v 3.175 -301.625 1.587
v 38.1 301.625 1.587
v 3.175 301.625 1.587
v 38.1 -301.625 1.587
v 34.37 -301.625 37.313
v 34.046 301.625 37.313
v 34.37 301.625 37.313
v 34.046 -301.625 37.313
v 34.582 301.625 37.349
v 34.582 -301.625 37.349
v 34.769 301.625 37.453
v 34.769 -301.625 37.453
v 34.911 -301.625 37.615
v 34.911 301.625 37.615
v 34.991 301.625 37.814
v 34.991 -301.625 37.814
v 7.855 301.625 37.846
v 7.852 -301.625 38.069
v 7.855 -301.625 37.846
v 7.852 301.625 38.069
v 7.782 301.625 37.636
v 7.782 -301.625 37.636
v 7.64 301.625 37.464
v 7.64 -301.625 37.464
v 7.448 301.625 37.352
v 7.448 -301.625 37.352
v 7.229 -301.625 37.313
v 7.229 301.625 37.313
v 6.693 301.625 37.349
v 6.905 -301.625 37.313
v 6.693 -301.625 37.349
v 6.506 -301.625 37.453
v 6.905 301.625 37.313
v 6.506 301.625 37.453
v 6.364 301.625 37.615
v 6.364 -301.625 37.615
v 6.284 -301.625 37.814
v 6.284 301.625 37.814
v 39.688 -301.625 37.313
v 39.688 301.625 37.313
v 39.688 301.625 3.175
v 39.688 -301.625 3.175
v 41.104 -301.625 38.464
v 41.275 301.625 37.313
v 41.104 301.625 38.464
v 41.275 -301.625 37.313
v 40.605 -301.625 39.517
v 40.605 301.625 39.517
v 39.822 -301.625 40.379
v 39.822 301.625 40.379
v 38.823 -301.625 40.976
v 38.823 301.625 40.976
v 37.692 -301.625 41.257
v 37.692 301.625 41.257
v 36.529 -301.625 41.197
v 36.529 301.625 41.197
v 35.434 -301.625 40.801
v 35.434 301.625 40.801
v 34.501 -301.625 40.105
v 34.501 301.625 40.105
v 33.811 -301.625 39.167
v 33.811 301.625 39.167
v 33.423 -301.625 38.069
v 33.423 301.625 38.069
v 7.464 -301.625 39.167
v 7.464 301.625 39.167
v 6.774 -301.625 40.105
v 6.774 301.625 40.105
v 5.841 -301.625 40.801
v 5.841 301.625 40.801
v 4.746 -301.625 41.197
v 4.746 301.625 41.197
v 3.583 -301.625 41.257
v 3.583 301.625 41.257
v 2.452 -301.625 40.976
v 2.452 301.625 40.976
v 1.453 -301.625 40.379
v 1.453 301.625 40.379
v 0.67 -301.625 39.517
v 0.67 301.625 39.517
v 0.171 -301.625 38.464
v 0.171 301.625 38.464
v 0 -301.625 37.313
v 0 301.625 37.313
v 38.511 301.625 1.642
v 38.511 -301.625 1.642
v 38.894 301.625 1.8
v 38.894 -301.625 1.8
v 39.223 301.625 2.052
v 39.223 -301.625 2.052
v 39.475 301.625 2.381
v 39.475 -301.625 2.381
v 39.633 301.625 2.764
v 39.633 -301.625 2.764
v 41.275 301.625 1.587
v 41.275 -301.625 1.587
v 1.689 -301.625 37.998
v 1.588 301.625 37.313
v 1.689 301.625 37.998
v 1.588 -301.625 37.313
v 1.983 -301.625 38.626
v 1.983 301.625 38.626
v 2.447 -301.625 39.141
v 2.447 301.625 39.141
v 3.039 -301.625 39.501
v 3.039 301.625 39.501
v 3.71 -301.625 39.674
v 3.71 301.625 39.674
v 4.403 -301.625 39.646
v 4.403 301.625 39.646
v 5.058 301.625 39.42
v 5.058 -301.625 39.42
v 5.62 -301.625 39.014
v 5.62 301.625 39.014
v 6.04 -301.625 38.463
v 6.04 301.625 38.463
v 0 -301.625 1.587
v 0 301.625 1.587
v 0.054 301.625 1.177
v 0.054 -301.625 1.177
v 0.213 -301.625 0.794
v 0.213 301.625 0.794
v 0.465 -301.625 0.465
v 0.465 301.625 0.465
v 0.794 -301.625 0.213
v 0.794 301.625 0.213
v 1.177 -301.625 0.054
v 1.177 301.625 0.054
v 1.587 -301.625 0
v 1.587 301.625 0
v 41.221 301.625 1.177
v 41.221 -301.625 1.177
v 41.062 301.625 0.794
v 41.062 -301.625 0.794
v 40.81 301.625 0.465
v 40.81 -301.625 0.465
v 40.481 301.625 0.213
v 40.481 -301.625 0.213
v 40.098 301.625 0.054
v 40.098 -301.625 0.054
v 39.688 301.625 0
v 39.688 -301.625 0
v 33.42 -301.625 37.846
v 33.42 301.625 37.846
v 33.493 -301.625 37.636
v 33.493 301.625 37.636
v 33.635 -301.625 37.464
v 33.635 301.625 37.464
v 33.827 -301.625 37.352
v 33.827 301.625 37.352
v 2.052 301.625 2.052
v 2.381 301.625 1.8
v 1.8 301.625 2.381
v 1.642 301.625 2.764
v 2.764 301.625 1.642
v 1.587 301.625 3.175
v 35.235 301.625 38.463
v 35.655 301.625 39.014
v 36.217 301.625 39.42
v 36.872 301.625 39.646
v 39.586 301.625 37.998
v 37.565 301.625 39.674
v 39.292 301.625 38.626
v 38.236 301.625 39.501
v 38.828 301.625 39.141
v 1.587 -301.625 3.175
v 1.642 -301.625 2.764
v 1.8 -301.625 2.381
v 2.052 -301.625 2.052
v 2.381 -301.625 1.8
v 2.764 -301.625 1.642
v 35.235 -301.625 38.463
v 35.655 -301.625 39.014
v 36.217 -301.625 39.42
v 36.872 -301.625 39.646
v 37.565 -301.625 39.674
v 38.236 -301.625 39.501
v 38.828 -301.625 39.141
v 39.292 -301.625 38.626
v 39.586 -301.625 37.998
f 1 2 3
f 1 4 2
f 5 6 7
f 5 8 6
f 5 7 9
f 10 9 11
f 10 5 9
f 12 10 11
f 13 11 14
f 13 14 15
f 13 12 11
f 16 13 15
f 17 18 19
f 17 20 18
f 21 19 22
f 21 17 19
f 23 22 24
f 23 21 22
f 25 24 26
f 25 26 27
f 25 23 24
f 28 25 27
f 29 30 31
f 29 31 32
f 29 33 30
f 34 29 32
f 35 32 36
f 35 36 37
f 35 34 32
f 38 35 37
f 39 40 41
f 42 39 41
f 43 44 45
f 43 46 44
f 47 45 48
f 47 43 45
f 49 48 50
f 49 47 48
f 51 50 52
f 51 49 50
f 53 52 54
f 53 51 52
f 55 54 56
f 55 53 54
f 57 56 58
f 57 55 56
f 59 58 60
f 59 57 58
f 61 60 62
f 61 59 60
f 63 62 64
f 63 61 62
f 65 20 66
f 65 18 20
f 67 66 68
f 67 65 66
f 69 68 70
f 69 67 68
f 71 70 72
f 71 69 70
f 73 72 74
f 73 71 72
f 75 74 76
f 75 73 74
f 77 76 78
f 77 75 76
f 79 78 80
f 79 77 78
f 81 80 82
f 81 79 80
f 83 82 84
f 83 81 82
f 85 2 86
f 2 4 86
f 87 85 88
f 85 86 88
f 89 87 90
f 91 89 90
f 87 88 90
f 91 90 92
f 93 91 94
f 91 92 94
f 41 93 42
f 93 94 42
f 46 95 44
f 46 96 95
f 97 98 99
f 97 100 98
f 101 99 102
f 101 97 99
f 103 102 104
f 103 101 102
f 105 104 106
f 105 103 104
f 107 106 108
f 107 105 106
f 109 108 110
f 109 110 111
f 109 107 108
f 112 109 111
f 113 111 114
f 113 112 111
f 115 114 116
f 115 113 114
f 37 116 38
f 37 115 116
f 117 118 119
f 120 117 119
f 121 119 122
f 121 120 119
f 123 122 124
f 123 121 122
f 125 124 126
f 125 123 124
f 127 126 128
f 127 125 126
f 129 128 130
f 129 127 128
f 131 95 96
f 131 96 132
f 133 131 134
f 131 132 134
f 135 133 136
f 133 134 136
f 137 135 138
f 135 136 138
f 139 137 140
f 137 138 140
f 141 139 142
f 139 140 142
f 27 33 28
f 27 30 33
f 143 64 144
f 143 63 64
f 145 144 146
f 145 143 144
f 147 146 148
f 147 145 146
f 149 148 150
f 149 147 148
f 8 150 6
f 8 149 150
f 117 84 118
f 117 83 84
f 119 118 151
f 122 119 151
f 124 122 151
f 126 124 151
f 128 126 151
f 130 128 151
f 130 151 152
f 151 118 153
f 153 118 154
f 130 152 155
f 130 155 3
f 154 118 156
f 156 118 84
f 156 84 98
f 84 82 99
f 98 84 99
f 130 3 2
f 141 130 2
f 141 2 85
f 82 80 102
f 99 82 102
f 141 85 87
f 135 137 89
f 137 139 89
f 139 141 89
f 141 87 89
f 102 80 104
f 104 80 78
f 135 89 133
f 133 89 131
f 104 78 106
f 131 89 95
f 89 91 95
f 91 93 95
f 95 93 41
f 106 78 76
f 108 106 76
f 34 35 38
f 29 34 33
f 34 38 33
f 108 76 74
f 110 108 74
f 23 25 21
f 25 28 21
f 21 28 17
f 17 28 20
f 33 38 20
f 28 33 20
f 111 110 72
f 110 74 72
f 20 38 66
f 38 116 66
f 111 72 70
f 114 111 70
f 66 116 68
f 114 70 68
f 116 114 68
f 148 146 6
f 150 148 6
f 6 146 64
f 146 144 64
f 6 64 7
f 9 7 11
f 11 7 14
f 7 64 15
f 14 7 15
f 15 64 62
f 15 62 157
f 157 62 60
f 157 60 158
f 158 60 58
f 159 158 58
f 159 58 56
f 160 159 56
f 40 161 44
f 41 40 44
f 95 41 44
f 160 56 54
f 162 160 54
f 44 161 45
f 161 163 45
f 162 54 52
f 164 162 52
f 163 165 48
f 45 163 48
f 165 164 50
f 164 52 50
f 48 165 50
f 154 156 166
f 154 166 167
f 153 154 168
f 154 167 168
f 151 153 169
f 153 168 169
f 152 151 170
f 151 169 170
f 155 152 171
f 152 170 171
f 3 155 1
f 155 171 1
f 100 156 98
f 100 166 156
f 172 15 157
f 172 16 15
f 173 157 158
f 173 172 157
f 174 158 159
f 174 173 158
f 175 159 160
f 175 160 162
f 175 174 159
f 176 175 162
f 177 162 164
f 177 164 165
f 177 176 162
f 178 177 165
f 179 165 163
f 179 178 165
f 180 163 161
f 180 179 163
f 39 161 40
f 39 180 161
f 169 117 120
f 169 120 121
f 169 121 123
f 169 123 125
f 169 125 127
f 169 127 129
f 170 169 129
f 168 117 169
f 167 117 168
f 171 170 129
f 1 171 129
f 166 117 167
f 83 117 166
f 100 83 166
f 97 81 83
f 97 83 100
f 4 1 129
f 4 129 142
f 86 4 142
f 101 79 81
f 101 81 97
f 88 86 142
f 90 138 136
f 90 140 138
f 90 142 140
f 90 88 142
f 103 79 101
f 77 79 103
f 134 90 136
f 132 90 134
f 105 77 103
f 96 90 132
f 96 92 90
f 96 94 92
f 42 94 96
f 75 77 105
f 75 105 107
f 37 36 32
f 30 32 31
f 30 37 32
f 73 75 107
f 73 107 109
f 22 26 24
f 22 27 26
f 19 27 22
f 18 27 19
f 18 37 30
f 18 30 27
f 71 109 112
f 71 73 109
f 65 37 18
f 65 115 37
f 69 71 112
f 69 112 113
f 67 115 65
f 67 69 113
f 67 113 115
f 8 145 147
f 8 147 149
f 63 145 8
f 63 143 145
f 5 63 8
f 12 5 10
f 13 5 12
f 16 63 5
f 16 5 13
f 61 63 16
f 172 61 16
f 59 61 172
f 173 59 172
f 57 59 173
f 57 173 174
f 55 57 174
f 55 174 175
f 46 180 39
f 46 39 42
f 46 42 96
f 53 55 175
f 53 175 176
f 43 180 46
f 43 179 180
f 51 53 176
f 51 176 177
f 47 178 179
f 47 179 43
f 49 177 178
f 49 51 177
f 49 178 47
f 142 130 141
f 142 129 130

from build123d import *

# Parameters (mm, degrees)
F1_DEPTH = 301.625
F2_R     = 1.5875
F3_R     = 0.635


with BuildPart() as f1:
    # F0 (on Front) → F1 (new body, symmetric)
    with BuildSketch(Plane.XZ):
        with BuildLine():
            Line((0, 37.3126), (0, 0))
            Line((0, 0), (41.275, 0))
            Line((41.275, 0), (41.275, 37.3126))
            ThreePointArc((41.275, 37.3126), (37.3126, 41.275), (33.3502, 37.3126))
            Line((33.3502, 37.3126), (34.9377, 37.3126))
            ThreePointArc((34.9377, 37.3126), (37.3126, 39.6875), (39.6875, 37.3126))
            Line((39.6875, 37.3126), (39.6875, 1.5875))
            Line((39.6875, 1.5875), (1.5875, 1.5875))
            Line((1.5875, 1.5875), (1.5875, 37.3126))
            ThreePointArc((1.5875, 37.3126), (3.9624, 39.6875), (6.3373, 37.3126))
            Line((6.3373, 37.3126), (7.9248, 37.3126))
            ThreePointArc((7.9248, 37.3126), (3.9624, 41.275), (0, 37.3126))
        make_face()
    extrude(amount=F1_DEPTH, both=True)

    # F2
    f2_edges = [f1.edges().sort_by_distance(p)[0] for p in [
        (0, 0, 0),
        (41.275, 0, 0),
        (39.6875, 0, 1.5875),
        (1.5875, 0, 1.5875),
    ]]
    fillet(f2_edges, radius=F2_R)

    # F3
    f3_edges = [f1.edges().sort_by_distance(p)[0] for p in [
        (6.3373, 0, 37.3126),
        (7.9248, 0, 37.3126),
        (33.3502, 0, 37.3126),
        (34.9377, 0, 37.3126),
    ]]
    fillet(f3_edges, radius=F3_R)


solid = f1.part
